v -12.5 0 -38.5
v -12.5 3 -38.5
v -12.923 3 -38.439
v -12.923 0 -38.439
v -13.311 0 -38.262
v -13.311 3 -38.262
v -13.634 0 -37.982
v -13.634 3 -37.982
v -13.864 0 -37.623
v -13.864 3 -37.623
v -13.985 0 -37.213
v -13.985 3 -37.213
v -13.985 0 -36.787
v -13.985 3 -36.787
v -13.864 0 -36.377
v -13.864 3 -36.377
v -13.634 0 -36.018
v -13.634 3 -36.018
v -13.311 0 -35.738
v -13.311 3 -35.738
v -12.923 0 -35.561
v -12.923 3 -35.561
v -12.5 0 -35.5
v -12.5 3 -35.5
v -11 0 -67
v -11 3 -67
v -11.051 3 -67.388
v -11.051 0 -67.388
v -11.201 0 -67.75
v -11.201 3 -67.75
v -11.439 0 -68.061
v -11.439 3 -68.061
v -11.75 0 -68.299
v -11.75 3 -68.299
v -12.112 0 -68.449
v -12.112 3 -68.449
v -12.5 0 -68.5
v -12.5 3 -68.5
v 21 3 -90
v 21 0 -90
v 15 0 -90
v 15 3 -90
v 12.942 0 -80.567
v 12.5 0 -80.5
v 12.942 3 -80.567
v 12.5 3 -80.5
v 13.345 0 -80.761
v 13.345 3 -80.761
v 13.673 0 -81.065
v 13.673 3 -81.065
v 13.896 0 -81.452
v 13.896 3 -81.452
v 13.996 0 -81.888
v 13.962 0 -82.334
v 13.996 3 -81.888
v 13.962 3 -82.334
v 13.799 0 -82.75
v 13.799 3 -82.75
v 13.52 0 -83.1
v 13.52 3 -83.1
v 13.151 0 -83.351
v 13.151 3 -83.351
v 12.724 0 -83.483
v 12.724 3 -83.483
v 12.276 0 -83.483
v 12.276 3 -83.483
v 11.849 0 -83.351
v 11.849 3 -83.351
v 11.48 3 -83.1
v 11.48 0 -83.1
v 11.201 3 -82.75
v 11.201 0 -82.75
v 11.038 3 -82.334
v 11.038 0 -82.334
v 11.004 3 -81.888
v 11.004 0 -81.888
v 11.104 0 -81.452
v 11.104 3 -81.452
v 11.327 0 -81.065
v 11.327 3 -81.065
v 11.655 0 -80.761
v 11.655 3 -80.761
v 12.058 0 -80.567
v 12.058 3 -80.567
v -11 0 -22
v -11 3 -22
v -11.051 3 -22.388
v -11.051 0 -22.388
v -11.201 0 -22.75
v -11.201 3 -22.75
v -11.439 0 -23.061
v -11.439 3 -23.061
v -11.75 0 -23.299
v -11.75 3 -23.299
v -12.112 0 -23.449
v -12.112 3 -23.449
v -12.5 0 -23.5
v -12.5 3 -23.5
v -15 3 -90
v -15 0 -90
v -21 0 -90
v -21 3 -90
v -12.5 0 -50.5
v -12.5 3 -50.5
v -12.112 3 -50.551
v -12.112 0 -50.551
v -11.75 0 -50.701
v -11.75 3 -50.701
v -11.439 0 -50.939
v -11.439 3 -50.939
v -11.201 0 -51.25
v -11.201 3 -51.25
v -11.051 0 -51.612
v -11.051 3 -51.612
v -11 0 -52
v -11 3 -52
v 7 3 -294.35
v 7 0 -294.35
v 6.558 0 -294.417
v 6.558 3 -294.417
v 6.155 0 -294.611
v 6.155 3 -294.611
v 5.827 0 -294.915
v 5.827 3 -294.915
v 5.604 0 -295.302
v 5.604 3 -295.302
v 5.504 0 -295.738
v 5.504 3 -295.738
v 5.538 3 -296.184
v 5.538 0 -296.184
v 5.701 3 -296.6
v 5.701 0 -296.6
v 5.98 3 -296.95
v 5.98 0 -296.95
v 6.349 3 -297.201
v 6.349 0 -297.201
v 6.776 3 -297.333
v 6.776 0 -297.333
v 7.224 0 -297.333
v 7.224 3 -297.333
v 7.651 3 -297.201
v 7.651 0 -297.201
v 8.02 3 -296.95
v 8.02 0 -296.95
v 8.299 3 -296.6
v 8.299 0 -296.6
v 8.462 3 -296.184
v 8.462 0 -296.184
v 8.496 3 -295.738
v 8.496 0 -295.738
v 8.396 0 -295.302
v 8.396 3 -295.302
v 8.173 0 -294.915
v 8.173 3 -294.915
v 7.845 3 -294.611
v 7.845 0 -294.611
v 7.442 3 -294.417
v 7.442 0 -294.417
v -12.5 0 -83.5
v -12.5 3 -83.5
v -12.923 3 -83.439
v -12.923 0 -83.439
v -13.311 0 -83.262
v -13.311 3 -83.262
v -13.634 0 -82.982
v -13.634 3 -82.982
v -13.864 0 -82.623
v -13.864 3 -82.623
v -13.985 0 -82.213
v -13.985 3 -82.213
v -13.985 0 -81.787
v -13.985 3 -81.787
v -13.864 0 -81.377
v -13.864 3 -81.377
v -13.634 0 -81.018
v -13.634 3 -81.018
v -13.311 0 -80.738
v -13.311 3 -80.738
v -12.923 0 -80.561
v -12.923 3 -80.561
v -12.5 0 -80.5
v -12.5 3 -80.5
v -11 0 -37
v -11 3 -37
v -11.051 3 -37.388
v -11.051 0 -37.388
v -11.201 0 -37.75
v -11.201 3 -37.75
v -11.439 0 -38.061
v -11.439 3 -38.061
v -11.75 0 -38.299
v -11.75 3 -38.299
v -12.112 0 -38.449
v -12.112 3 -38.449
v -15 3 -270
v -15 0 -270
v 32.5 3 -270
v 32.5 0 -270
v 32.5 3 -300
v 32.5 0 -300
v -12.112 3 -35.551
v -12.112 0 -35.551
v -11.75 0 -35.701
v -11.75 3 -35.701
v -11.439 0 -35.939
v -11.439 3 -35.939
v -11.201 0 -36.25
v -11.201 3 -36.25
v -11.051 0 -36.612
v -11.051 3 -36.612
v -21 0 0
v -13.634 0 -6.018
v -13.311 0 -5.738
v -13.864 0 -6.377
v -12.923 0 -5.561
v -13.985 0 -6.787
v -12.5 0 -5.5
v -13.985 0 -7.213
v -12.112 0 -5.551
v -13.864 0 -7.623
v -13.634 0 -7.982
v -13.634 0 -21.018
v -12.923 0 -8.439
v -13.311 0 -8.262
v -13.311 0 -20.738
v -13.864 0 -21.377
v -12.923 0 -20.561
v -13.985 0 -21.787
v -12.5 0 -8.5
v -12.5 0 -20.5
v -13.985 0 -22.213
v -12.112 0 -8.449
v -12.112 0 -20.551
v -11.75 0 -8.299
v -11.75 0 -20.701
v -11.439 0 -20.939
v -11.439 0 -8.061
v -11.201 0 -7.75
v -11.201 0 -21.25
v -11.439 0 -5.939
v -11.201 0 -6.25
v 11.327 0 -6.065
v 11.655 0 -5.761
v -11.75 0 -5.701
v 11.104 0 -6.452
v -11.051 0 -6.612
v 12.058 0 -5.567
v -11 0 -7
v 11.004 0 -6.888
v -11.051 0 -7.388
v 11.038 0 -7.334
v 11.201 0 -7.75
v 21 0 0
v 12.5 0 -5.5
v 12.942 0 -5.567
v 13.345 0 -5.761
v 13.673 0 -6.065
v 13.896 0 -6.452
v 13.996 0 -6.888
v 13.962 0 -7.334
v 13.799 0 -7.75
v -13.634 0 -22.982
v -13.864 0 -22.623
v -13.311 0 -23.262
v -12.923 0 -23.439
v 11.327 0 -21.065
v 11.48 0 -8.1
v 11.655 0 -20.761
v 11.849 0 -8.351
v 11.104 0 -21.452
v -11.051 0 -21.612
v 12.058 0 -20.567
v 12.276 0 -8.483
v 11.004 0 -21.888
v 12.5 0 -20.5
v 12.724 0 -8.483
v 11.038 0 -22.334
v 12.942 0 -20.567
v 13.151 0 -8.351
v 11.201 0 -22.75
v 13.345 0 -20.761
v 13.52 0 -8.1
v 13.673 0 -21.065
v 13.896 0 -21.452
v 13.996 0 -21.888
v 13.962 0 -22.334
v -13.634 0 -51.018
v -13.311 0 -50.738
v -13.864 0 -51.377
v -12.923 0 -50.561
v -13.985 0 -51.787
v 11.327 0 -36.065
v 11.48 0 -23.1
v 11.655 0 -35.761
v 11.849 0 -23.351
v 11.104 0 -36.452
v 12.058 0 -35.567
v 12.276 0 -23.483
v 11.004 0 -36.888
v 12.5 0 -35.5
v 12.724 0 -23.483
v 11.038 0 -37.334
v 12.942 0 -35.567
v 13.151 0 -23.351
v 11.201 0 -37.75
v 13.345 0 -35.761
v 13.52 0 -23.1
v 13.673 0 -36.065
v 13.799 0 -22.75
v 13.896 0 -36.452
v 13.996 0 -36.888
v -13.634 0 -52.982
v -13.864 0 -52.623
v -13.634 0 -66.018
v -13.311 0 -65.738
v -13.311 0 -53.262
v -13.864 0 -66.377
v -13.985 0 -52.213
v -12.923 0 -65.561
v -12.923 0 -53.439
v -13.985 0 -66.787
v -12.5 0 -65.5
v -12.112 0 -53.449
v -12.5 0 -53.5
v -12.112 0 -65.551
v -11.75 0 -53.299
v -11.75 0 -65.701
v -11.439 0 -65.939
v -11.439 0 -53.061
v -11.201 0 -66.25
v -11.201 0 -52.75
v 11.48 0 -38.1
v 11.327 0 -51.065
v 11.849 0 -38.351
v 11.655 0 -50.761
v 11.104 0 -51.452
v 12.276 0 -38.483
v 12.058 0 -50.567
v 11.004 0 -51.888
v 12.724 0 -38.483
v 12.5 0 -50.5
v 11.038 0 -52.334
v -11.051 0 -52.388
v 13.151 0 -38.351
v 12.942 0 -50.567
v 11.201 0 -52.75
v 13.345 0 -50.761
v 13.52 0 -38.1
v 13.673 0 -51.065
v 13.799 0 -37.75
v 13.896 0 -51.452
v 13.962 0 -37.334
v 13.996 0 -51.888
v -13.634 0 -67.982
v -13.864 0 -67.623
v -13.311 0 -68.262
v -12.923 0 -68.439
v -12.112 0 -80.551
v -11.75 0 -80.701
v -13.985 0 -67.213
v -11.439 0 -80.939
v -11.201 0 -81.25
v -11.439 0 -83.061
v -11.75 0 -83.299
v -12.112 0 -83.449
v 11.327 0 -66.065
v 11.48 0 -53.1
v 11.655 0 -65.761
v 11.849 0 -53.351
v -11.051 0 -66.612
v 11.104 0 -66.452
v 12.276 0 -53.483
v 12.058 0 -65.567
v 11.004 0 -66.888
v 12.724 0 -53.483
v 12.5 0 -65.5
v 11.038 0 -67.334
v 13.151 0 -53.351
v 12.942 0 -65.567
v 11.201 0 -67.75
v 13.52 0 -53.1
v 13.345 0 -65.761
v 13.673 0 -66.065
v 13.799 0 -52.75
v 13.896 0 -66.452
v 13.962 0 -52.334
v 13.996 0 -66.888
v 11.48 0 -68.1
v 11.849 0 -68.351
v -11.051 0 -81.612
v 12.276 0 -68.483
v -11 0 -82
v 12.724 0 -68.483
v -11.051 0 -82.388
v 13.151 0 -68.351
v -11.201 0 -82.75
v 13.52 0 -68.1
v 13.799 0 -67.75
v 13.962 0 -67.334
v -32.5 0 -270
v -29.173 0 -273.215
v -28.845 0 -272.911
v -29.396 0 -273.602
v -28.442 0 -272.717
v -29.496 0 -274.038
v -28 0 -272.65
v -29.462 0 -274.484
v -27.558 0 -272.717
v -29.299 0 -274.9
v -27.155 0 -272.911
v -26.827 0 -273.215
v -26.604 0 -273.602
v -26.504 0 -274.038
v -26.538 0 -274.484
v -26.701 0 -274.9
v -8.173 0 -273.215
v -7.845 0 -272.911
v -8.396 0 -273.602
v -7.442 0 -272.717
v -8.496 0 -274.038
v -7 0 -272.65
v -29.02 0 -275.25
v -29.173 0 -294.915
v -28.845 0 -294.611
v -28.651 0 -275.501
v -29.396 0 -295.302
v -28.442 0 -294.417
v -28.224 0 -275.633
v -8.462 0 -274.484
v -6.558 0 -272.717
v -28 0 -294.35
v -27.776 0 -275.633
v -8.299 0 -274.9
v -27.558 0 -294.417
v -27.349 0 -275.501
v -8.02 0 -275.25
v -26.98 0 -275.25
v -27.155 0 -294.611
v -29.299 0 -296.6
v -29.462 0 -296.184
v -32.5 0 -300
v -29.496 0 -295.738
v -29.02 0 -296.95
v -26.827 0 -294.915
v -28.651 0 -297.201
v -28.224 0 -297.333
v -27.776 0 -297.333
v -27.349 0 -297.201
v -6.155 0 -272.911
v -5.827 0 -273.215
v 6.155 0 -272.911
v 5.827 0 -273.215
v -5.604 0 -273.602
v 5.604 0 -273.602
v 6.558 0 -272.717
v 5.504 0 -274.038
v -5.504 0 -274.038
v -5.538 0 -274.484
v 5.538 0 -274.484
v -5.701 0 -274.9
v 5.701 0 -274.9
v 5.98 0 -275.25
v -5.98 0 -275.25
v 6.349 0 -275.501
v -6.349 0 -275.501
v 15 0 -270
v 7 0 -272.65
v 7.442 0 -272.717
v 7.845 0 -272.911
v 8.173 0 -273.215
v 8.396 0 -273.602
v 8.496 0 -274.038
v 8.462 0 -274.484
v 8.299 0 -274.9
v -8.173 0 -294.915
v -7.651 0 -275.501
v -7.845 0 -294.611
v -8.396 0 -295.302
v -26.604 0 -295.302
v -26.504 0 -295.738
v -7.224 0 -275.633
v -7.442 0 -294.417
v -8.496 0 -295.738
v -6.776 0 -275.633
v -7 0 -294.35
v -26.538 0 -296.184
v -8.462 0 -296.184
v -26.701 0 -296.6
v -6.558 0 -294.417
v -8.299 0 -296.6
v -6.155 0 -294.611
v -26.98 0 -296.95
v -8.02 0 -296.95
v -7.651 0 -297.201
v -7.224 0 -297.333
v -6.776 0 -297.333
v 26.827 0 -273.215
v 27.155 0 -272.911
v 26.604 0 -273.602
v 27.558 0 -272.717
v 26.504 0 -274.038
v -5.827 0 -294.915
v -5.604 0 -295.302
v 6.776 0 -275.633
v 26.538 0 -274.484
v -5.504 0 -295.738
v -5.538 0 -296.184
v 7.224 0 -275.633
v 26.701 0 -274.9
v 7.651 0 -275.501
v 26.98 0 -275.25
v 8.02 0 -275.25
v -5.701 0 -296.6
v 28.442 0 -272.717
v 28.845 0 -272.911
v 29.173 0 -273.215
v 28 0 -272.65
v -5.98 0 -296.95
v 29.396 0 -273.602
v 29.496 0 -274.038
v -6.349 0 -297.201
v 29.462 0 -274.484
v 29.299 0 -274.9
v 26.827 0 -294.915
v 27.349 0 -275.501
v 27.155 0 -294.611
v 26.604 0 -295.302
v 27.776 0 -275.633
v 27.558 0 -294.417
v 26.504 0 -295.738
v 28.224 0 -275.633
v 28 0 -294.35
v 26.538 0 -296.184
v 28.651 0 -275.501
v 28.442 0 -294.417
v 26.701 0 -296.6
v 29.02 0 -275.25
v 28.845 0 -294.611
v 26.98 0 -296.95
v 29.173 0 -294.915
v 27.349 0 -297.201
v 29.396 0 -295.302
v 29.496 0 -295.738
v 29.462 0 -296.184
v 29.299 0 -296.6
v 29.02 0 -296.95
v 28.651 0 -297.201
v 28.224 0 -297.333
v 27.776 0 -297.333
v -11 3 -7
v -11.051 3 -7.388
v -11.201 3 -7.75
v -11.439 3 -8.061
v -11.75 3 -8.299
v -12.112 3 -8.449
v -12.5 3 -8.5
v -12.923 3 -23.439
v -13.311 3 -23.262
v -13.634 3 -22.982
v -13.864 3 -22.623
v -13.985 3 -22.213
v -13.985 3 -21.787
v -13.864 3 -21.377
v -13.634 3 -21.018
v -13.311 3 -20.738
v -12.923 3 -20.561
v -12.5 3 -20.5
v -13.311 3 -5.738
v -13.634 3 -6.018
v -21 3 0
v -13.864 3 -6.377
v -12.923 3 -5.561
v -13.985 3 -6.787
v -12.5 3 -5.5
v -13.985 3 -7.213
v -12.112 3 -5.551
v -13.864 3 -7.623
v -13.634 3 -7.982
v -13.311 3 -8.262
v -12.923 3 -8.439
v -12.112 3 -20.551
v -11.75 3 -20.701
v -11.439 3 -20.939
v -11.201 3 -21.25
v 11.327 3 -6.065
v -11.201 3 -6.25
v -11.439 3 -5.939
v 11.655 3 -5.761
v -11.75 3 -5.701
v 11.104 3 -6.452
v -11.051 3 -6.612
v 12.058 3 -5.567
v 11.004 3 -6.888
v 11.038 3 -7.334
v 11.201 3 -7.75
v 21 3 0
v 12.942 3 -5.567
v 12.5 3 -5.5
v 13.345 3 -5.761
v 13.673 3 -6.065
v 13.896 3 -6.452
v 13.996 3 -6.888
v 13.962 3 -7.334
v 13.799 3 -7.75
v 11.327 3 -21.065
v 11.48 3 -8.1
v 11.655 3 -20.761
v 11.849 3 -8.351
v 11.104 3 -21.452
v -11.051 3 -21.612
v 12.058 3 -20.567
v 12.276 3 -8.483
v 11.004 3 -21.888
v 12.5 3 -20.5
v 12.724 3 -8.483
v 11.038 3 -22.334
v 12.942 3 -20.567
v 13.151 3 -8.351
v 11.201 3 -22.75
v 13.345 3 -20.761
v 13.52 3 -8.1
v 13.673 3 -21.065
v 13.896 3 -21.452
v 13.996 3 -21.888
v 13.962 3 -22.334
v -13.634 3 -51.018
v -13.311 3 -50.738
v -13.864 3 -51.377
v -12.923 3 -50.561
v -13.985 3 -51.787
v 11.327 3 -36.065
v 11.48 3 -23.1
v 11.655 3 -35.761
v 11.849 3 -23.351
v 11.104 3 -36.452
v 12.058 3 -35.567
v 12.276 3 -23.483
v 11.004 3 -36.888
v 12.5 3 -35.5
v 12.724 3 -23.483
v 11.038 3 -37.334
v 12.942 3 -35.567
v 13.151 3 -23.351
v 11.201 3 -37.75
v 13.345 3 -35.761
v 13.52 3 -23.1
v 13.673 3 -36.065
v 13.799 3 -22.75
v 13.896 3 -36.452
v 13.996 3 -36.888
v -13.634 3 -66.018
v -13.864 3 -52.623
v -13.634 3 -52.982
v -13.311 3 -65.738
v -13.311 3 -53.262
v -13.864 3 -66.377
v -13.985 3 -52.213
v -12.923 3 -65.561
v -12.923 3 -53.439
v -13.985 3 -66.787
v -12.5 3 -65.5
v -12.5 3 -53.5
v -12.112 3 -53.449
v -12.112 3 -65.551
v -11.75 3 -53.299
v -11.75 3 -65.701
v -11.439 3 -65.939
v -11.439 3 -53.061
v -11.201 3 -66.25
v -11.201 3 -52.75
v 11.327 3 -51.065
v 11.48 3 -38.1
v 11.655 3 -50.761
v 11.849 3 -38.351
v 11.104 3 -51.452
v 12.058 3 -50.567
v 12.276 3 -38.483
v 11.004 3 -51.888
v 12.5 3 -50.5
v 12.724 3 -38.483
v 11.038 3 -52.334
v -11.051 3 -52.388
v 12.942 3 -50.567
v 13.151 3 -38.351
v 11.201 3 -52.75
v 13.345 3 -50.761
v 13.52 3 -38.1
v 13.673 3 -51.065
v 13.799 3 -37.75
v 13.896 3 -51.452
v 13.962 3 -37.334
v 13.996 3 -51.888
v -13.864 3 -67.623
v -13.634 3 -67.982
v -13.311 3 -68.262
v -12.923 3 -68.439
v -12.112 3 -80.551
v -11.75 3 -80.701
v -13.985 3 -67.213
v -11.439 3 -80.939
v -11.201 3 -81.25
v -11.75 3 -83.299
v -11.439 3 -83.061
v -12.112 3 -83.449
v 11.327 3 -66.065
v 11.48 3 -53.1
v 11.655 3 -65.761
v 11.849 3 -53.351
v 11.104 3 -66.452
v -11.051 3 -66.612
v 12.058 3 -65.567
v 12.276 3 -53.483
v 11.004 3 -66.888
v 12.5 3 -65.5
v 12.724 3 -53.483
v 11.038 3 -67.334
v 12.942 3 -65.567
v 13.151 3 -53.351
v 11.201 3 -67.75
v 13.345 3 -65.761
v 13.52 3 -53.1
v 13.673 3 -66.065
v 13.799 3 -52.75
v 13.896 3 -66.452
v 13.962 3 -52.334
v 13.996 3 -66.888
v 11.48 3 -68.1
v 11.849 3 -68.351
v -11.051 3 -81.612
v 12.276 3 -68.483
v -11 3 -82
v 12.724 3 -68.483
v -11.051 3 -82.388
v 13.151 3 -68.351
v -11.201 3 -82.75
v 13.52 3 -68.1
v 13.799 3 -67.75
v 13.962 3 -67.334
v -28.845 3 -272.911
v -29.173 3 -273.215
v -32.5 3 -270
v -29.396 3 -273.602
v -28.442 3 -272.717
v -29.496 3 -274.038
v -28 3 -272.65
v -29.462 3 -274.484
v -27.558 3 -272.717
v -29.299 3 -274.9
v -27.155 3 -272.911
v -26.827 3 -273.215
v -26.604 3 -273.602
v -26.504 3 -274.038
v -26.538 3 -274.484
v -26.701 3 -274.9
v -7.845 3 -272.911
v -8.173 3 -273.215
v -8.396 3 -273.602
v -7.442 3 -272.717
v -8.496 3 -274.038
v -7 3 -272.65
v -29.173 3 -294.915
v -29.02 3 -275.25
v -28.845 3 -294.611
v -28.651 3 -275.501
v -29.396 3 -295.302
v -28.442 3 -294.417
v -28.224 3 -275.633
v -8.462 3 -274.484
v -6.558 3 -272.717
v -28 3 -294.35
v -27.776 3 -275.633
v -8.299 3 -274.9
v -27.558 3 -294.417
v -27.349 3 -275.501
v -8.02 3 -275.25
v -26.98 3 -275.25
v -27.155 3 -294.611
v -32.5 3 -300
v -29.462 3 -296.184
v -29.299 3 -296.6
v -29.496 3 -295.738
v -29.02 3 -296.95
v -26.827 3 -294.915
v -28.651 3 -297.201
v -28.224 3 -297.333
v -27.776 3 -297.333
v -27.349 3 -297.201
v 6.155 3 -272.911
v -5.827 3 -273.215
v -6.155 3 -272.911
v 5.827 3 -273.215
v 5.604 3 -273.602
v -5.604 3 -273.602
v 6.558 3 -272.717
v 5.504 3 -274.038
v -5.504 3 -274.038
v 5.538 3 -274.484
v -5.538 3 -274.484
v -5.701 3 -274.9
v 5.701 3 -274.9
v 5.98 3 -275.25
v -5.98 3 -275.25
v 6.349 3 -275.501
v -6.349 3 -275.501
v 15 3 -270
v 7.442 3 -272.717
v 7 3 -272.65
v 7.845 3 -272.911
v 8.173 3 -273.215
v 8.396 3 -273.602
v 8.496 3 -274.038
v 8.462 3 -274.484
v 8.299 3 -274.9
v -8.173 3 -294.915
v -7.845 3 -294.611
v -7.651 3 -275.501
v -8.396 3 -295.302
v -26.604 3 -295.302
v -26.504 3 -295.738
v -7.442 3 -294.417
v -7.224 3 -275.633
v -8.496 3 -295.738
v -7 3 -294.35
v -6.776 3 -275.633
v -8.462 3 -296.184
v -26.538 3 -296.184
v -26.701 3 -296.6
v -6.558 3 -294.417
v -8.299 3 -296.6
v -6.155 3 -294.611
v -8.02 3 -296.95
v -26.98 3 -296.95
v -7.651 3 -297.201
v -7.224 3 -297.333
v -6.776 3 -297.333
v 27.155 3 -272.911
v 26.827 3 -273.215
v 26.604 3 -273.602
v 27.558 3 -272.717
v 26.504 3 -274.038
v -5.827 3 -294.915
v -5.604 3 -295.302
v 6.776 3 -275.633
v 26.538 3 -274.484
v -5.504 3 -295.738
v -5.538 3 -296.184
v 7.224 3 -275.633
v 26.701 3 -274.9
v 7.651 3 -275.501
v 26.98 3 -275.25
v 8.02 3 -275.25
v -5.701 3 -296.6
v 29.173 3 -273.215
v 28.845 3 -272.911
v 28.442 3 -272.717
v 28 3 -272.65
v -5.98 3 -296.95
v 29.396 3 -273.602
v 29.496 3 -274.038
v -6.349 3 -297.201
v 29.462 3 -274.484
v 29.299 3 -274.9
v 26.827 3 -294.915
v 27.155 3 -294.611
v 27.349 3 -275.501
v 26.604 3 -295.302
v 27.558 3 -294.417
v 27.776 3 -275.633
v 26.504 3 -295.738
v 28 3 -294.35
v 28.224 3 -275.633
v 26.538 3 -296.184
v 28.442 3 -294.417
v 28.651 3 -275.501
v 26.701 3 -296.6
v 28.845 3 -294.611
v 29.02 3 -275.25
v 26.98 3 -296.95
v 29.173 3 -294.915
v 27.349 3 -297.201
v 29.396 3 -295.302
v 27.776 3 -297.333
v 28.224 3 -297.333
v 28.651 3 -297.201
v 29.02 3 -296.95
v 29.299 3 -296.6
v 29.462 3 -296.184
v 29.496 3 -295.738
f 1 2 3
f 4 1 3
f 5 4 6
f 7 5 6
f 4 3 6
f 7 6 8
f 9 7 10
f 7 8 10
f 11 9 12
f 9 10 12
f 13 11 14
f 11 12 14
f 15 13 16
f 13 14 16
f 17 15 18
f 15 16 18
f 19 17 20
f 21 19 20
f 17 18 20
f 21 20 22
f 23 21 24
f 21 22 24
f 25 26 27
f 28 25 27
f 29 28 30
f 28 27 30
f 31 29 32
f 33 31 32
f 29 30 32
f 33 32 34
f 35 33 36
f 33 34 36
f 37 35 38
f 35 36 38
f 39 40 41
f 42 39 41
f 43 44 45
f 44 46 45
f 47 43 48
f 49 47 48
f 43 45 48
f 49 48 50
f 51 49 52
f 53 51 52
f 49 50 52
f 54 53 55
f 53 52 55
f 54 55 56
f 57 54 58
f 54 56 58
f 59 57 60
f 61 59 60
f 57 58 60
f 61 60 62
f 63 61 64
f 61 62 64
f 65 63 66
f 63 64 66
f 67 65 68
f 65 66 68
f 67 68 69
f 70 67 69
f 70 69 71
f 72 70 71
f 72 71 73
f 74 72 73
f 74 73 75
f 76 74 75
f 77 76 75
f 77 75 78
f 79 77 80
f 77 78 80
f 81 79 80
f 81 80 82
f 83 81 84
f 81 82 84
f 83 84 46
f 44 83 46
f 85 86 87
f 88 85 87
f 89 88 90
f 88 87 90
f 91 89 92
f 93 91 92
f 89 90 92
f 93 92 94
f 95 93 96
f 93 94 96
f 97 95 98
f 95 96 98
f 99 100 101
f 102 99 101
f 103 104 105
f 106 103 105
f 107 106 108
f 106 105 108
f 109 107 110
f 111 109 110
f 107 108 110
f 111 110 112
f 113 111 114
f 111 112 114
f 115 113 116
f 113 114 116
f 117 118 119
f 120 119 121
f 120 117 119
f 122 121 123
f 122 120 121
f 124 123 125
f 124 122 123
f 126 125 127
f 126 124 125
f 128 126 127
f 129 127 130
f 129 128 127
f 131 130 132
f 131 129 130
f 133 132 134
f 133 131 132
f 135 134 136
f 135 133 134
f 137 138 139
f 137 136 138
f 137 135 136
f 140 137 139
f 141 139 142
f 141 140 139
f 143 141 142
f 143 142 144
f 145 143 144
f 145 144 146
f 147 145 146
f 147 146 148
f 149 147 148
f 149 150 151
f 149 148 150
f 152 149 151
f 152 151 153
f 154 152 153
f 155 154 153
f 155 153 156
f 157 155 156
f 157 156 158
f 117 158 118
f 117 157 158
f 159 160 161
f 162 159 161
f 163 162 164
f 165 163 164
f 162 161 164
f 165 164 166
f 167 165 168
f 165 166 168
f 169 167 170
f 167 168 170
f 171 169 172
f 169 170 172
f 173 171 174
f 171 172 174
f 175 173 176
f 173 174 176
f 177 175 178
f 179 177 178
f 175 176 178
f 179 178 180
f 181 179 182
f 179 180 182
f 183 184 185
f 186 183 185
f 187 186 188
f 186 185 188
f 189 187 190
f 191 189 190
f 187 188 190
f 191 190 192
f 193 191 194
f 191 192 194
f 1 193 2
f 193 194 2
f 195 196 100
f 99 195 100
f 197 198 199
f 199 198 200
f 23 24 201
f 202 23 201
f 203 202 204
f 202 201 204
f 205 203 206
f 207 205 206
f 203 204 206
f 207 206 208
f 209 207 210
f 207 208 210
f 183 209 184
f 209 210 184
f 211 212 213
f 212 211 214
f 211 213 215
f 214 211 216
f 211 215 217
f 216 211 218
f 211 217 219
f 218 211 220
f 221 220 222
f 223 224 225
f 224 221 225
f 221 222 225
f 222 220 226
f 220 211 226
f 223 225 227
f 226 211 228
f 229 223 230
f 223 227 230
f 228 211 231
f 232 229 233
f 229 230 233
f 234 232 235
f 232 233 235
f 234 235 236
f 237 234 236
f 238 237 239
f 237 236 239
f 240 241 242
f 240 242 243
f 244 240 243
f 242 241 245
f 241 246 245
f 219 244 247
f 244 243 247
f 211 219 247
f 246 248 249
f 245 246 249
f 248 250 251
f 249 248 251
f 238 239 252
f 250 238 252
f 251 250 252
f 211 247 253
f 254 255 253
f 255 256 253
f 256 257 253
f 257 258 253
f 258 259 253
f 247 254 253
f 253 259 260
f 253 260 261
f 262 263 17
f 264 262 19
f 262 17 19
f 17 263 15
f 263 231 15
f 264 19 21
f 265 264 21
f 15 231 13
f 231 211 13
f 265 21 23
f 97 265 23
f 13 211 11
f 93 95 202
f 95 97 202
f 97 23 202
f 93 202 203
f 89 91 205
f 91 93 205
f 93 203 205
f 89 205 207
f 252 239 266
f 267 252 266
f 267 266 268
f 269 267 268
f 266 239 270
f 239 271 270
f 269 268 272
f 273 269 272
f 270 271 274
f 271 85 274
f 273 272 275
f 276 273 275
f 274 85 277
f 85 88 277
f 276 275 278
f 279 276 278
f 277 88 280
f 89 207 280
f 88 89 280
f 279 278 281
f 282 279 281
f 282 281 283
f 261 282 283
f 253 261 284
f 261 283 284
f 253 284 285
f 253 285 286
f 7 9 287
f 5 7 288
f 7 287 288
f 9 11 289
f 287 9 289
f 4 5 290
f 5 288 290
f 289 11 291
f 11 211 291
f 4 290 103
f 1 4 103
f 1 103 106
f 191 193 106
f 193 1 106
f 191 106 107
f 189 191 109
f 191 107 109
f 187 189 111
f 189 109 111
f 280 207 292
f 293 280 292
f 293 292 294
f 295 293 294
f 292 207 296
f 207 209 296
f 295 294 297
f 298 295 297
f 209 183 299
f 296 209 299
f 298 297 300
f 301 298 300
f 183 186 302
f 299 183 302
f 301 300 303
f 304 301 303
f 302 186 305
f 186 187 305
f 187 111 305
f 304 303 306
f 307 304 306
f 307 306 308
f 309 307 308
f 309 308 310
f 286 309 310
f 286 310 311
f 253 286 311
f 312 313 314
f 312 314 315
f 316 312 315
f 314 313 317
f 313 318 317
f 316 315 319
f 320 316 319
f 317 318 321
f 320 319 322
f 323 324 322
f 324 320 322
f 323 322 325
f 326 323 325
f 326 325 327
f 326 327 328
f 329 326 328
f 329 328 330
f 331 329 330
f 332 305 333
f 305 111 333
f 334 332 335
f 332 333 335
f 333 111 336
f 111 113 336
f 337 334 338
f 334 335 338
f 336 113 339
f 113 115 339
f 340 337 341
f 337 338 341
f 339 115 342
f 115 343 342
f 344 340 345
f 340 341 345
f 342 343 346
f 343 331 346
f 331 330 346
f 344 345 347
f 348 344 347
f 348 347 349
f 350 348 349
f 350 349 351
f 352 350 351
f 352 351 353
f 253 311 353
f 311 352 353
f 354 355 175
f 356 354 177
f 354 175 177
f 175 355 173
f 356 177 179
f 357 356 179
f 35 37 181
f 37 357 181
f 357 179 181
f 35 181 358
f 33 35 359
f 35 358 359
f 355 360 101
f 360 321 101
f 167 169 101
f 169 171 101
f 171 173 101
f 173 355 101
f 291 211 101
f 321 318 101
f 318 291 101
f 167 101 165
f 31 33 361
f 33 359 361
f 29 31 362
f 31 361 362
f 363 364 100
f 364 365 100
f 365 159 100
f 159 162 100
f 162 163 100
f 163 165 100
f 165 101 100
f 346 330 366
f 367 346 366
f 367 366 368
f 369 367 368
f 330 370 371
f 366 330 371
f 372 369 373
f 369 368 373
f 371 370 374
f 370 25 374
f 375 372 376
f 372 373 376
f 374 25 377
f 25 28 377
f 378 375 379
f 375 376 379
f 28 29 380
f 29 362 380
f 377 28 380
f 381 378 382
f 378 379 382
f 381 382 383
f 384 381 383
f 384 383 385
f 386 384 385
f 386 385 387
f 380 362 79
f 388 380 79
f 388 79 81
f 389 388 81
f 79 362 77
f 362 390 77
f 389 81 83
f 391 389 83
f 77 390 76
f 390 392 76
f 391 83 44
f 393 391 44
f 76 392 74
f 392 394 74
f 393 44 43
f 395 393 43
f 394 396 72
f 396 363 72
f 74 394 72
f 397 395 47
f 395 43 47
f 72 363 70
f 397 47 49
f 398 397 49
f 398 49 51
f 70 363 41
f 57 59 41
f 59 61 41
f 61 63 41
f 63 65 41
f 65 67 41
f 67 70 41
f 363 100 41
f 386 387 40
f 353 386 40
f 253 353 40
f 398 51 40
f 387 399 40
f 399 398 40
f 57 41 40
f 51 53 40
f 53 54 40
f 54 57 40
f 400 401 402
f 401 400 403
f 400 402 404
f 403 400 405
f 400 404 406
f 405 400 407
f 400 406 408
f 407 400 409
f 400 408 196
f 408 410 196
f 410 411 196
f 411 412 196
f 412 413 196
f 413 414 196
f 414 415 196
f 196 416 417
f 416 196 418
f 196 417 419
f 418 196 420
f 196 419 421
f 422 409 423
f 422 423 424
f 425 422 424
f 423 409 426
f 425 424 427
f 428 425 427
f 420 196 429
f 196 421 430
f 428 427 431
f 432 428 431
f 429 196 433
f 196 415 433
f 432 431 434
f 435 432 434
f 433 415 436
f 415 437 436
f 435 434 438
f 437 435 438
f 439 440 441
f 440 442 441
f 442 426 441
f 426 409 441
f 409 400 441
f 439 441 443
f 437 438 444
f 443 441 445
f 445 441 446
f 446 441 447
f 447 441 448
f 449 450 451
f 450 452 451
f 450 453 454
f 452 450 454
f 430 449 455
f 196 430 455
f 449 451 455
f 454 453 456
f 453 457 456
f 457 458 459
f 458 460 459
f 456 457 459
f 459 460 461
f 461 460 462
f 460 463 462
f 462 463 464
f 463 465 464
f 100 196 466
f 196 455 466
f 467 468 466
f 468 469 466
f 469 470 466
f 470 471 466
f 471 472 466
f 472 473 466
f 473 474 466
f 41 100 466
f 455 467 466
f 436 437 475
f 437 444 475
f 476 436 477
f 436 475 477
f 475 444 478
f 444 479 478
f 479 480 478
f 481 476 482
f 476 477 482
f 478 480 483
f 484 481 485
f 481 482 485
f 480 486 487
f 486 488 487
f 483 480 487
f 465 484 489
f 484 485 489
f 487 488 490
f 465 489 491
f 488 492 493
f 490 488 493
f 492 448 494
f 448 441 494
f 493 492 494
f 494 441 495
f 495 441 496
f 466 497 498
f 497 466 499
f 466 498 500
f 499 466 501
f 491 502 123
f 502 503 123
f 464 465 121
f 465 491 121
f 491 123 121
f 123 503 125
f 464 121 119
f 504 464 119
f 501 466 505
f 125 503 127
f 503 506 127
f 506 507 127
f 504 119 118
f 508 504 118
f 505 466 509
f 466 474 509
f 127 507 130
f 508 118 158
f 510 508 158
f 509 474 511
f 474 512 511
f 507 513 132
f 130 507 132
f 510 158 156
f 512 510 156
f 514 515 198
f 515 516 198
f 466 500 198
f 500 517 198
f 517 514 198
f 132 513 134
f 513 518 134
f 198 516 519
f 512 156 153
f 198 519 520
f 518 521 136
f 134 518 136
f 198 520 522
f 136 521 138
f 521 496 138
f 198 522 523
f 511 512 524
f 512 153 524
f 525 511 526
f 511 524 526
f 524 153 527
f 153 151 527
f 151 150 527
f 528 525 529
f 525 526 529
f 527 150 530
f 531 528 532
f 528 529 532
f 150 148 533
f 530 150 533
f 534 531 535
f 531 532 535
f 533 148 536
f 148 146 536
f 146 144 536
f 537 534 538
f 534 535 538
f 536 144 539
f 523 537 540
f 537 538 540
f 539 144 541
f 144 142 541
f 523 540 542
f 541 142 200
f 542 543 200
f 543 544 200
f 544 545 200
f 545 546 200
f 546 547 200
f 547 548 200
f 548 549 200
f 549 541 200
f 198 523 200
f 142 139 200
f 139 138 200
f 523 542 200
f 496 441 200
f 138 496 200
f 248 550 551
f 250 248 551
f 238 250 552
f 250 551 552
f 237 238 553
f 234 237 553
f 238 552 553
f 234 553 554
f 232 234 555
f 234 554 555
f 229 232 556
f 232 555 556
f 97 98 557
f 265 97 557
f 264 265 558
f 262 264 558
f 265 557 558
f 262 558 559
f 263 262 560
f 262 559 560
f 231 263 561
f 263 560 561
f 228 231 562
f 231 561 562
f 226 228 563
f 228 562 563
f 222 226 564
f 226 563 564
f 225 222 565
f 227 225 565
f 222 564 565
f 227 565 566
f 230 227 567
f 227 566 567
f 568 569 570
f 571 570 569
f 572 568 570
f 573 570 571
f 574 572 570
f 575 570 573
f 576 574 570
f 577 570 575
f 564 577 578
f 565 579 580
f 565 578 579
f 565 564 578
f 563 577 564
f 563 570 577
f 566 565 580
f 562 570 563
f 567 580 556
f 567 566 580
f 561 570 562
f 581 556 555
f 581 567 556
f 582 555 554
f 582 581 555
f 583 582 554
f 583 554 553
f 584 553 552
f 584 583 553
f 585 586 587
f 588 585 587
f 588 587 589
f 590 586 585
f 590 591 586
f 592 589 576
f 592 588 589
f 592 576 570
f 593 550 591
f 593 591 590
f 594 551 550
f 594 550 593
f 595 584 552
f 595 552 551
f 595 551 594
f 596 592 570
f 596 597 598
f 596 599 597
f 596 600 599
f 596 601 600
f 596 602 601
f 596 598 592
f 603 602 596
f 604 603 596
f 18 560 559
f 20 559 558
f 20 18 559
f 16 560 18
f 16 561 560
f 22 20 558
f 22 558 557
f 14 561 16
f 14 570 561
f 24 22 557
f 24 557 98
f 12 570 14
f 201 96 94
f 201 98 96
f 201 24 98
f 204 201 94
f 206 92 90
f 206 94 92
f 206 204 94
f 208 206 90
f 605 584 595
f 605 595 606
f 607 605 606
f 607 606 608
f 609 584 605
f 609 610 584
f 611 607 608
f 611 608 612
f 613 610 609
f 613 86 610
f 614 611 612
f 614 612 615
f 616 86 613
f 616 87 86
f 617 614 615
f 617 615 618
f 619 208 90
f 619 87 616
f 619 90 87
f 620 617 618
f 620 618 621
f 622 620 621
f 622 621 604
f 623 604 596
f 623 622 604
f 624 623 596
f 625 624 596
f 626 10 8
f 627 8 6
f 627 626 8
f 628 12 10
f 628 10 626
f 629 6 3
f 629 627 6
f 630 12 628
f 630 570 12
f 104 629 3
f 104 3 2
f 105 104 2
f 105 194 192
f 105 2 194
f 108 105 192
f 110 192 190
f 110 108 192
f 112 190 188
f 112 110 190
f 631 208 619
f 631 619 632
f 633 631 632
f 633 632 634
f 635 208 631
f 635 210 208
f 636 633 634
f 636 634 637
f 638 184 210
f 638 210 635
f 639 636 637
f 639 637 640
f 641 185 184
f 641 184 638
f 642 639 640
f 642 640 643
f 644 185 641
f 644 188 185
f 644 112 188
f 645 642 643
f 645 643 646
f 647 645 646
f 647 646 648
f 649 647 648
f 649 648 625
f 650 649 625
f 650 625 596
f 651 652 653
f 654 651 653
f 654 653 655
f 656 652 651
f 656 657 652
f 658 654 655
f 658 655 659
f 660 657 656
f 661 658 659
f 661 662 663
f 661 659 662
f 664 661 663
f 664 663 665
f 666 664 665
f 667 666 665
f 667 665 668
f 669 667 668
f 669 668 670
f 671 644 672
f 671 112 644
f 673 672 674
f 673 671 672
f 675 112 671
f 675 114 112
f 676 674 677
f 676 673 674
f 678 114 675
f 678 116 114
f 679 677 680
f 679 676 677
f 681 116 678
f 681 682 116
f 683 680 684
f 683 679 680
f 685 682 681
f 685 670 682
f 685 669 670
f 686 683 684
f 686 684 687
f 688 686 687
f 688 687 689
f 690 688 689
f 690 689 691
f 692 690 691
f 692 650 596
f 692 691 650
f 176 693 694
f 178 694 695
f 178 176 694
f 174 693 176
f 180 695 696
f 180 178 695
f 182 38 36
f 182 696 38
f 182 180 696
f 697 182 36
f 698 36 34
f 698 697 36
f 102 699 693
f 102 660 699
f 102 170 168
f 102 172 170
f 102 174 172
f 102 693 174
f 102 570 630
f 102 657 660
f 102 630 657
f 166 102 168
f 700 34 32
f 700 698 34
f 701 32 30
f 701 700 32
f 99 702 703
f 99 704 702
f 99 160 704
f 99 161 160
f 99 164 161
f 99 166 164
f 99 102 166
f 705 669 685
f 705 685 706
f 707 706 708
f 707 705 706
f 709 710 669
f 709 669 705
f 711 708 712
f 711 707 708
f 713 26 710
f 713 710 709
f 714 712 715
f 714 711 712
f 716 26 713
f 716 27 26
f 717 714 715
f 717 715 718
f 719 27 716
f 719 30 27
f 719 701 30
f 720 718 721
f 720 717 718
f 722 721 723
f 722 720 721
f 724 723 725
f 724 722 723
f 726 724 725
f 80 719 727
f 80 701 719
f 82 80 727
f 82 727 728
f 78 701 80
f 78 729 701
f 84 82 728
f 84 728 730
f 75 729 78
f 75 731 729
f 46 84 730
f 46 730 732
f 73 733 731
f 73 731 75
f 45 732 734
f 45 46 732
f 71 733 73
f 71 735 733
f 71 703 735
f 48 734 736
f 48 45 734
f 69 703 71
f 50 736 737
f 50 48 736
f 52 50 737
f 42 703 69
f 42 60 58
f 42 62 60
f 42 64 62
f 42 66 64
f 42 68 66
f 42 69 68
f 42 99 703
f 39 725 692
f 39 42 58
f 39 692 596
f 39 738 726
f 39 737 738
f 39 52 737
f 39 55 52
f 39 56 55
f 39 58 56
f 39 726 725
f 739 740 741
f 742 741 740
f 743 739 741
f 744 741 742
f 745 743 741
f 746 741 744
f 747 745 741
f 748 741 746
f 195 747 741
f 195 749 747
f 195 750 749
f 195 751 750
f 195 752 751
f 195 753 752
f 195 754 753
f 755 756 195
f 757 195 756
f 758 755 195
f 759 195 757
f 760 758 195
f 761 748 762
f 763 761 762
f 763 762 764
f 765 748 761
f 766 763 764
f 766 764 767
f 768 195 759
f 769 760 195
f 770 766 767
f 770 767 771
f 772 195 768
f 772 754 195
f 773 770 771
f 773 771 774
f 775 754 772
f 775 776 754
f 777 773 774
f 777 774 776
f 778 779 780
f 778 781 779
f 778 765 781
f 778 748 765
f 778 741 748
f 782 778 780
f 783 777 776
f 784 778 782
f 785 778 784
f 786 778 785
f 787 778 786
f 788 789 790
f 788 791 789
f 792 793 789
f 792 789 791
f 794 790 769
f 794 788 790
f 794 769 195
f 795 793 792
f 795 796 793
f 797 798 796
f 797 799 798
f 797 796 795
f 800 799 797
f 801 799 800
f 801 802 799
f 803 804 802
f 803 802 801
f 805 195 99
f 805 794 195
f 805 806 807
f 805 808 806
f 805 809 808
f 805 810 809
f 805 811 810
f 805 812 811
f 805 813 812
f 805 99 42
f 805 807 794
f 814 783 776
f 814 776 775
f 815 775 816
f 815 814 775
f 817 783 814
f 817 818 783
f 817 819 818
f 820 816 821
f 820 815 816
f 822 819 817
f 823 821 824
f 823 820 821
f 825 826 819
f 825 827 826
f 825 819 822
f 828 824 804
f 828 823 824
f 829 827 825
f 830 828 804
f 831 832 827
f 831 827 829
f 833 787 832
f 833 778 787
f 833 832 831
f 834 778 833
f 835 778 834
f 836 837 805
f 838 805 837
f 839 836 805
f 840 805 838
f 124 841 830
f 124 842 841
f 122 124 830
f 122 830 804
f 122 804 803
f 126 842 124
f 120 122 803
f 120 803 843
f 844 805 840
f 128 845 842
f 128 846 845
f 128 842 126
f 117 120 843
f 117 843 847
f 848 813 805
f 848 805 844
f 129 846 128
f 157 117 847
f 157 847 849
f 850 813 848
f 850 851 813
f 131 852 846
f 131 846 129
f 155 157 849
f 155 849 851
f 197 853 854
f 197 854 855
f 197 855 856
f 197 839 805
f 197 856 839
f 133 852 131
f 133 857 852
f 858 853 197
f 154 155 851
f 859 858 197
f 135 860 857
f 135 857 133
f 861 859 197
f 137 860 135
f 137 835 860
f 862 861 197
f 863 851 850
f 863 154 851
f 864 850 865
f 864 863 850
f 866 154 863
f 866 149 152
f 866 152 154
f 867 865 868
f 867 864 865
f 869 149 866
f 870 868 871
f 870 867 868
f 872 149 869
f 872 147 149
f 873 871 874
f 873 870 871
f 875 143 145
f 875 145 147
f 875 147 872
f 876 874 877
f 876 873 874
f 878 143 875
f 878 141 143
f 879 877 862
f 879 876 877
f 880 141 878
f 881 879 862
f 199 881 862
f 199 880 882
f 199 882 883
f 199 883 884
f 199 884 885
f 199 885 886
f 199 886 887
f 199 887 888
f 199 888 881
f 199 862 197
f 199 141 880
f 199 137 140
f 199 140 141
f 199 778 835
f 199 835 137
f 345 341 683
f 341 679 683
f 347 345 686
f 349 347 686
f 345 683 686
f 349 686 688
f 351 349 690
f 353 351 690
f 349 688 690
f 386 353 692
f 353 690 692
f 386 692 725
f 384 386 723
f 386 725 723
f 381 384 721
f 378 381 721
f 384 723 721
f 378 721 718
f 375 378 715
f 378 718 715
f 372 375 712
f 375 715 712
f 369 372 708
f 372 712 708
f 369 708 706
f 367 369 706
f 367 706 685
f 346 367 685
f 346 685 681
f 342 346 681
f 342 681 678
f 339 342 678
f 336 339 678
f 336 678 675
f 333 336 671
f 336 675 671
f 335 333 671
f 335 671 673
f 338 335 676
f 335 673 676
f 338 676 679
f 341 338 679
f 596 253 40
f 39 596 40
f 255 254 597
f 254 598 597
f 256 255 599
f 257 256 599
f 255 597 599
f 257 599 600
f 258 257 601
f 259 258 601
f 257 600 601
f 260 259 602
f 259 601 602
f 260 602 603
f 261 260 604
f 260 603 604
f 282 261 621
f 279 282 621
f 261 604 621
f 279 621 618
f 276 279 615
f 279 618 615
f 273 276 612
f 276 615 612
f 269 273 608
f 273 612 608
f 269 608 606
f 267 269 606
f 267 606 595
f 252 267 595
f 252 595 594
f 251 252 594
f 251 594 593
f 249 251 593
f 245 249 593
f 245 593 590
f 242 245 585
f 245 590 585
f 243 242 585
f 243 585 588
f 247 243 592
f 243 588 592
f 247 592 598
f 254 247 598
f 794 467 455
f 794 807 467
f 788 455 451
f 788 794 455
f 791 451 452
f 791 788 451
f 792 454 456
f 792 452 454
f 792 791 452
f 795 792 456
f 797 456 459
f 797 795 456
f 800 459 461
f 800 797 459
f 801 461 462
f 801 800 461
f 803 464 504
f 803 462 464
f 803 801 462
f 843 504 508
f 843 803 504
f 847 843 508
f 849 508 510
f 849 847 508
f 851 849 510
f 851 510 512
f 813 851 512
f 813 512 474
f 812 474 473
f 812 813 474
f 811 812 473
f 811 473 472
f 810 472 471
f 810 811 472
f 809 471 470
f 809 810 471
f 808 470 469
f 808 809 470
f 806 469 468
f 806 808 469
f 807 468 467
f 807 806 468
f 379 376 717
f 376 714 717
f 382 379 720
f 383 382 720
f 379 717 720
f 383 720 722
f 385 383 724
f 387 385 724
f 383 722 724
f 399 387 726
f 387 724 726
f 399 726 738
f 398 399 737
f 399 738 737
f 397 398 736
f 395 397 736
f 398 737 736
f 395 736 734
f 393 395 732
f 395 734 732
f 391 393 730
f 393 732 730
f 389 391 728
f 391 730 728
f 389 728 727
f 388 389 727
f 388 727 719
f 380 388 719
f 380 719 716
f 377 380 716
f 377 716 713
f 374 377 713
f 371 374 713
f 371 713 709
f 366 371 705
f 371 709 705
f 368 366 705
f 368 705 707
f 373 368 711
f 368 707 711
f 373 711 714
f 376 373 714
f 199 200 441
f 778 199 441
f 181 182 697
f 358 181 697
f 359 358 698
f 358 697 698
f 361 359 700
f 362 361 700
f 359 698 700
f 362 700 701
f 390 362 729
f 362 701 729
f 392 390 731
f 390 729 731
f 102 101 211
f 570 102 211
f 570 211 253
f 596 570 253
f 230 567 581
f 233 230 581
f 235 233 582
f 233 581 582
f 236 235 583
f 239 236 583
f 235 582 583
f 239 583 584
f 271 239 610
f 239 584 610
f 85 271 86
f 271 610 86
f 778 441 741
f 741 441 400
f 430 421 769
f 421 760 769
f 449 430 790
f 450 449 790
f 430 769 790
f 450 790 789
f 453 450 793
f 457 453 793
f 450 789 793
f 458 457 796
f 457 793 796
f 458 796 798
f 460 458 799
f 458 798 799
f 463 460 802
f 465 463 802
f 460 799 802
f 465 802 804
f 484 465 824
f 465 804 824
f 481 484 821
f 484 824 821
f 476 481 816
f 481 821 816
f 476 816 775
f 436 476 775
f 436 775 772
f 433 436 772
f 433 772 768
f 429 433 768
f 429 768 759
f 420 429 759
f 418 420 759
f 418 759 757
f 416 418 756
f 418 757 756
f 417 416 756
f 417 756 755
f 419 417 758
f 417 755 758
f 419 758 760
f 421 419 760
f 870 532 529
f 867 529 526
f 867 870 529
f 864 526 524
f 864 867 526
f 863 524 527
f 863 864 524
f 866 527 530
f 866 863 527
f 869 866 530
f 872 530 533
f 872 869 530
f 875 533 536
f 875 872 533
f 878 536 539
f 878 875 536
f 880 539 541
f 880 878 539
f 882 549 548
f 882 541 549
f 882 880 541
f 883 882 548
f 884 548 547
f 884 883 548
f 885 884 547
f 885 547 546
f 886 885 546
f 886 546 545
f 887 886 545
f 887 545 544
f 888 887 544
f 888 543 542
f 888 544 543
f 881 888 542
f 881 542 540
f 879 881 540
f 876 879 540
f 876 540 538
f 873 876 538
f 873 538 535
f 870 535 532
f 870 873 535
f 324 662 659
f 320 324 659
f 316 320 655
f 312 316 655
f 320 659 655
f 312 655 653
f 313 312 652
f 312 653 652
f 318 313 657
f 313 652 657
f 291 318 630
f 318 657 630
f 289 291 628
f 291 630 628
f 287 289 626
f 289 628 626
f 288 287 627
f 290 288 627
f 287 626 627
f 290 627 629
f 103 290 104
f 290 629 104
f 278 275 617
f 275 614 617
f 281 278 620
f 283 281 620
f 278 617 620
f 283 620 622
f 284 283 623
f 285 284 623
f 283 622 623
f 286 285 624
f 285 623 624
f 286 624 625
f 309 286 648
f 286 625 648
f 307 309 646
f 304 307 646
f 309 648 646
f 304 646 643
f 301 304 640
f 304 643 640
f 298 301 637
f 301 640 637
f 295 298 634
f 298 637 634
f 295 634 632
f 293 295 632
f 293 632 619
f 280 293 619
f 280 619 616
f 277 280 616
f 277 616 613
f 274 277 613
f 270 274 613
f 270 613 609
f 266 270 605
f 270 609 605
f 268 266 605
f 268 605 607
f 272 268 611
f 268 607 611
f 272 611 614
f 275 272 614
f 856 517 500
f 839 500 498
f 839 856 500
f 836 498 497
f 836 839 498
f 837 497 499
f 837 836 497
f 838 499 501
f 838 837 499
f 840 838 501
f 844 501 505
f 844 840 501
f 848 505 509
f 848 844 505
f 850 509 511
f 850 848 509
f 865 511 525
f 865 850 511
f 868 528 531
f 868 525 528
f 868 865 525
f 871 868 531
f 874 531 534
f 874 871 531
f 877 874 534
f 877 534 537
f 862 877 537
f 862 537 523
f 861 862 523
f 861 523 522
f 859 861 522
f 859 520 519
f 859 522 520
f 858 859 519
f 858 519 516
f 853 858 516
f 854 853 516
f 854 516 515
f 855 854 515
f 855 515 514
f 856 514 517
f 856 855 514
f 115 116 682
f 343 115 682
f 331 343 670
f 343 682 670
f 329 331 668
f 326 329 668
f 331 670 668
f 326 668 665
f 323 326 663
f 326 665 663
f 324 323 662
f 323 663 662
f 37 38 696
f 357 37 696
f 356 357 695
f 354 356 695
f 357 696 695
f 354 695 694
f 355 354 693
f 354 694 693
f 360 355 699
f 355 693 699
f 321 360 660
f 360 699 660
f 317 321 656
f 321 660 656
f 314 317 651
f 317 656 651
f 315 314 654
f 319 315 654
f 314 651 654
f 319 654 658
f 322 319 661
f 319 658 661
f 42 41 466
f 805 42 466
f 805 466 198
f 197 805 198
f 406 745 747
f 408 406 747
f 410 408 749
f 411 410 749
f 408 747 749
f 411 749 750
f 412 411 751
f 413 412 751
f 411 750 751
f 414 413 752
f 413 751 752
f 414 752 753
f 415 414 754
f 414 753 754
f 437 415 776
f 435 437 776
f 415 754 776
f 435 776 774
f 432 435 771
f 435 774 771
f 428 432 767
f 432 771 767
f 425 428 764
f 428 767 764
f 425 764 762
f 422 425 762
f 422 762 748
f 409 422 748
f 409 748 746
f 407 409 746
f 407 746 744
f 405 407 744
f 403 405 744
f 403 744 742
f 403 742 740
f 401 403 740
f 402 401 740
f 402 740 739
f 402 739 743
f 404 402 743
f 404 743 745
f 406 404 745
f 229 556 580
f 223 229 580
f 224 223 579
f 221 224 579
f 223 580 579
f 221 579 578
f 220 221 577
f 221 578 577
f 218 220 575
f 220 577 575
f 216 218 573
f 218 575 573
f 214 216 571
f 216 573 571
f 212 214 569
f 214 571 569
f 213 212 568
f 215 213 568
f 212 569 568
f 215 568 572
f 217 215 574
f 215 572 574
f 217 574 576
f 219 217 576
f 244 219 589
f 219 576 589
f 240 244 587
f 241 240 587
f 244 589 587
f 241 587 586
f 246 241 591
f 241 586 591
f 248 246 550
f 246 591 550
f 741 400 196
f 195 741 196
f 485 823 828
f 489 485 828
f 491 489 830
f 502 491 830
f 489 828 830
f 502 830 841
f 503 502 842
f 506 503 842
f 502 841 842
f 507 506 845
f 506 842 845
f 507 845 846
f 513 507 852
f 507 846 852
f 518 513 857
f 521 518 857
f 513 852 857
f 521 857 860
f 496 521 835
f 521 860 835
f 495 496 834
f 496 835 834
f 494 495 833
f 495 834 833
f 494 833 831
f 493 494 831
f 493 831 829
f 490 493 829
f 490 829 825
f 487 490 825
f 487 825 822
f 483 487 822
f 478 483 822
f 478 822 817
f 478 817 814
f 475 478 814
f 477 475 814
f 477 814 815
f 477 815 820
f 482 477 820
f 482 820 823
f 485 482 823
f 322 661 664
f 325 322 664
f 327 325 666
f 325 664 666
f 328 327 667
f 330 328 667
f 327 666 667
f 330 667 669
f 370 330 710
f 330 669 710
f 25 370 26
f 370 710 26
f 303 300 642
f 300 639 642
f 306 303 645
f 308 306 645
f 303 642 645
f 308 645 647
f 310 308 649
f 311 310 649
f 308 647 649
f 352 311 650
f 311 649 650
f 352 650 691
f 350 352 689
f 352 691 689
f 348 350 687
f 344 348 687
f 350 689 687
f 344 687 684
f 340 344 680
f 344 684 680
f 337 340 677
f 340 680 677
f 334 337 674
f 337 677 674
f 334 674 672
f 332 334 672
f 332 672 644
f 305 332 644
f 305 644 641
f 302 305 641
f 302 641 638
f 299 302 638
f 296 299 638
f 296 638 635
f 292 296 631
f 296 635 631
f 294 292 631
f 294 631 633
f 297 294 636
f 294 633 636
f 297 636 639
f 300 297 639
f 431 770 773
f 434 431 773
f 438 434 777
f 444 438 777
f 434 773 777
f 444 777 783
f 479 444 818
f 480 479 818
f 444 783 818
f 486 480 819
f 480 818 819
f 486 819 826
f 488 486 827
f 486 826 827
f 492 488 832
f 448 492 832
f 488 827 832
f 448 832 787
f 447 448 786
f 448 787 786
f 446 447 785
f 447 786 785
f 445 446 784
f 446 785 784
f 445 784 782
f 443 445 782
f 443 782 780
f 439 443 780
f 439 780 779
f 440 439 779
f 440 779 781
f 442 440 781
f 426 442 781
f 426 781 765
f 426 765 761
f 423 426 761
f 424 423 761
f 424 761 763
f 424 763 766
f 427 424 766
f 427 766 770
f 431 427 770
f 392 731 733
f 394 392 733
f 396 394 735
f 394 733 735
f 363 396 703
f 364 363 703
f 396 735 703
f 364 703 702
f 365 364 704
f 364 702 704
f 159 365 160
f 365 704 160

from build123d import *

# Parameters (mm, degrees)
BOSS_EXTRUDE1_DEPTH = 3
SKETCH2_R           = 1.5
CUT_EXTRUDE1_DEPTH  = 302.770194022
SKETCH3_R           = 1.5
CUT_EXTRUDE2_DEPTH  = 302.770194022
LPATTERN1_COUNT     = 6
LPATTERN1_PITCH     = 15


with BuildPart() as part:
    # Sketch1 → Boss-Extrude1 (new body)
    with BuildSketch(Plane(origin=(0, 0, 0), x_dir=(1, 0, 0), z_dir=(0, 1, 0))):
        Polygon((32.5, 300), (-32.5, 300), (-32.5, 270), (-15, 270), (-15, 90), (-21, 90), (-21, 0), (21, 0), (21, 90), (15, 90), (15, 270), (32.5, 270), align=None)
    extrude(amount=BOSS_EXTRUDE1_DEPTH)

    # Sketch2 → Cut-Extrude1 (cut, symmetric)
    with BuildSketch(Plane(origin=(0, 3, 0), x_dir=(1, 0, 0), z_dir=(0, 1, 0))):
        with Locations(Location((-28, 295.85, 0), (0, 0, 270))):
            Circle(SKETCH2_R)
        with Locations(Location((-7, 295.85, 0), (0, 0, 270))):
            Circle(SKETCH2_R)
        with Locations(Location((-28, 274.15, 0), (0, 0, 270))):
            Circle(SKETCH2_R)
        with Locations(Location((-7, 274.15, 0), (0, 0, 270))):
            Circle(SKETCH2_R)
    cut_extrude1 = extrude(amount=CUT_EXTRUDE1_DEPTH, both=True, mode=Mode.SUBTRACT)

    # Mirror1: Cut-Extrude1 across plane
    add(cut_extrude1.mirror(Plane(origin=(0, 0, 0), x_dir=(0, 0, 1), z_dir=(1, 0, 0))), mode=Mode.SUBTRACT)

    # Sketch3 → Cut-Extrude2 (cut, symmetric)
    with BuildSketch(Plane(origin=(0, 3, 0), x_dir=(1, 0, 0), z_dir=(0, 1, 0))):
        with BuildLine():
            ThreePointArc((-11, 82), (-11.439339828, 83.060660172), (-12.5, 83.5))
            Line((-12.5, 83.5), (-12.5, 80.5))
            ThreePointArc((-12.5, 80.5), (-11.439339828, 80.939339828), (-11, 82))
        make_face()
        with BuildLine():
            Line((-12.5, 80.5), (-12.5, 83.5))
            ThreePointArc((-12.5, 83.5), (-14, 82), (-12.5, 80.5))
        make_face()
        with Locations(Location((12.5, 82, 0), (0, 0, 270))):
            Circle(SKETCH3_R)
    cut_extrude2 = extrude(amount=CUT_EXTRUDE2_DEPTH, both=True, mode=Mode.SUBTRACT)

    # LPattern1: Cut-Extrude2 ×6
    with Locations(*[(0, 0, i * LPATTERN1_PITCH) for i in range(1, LPATTERN1_COUNT)]):
        add(cut_extrude2, mode=Mode.SUBTRACT)


solid = part.part
